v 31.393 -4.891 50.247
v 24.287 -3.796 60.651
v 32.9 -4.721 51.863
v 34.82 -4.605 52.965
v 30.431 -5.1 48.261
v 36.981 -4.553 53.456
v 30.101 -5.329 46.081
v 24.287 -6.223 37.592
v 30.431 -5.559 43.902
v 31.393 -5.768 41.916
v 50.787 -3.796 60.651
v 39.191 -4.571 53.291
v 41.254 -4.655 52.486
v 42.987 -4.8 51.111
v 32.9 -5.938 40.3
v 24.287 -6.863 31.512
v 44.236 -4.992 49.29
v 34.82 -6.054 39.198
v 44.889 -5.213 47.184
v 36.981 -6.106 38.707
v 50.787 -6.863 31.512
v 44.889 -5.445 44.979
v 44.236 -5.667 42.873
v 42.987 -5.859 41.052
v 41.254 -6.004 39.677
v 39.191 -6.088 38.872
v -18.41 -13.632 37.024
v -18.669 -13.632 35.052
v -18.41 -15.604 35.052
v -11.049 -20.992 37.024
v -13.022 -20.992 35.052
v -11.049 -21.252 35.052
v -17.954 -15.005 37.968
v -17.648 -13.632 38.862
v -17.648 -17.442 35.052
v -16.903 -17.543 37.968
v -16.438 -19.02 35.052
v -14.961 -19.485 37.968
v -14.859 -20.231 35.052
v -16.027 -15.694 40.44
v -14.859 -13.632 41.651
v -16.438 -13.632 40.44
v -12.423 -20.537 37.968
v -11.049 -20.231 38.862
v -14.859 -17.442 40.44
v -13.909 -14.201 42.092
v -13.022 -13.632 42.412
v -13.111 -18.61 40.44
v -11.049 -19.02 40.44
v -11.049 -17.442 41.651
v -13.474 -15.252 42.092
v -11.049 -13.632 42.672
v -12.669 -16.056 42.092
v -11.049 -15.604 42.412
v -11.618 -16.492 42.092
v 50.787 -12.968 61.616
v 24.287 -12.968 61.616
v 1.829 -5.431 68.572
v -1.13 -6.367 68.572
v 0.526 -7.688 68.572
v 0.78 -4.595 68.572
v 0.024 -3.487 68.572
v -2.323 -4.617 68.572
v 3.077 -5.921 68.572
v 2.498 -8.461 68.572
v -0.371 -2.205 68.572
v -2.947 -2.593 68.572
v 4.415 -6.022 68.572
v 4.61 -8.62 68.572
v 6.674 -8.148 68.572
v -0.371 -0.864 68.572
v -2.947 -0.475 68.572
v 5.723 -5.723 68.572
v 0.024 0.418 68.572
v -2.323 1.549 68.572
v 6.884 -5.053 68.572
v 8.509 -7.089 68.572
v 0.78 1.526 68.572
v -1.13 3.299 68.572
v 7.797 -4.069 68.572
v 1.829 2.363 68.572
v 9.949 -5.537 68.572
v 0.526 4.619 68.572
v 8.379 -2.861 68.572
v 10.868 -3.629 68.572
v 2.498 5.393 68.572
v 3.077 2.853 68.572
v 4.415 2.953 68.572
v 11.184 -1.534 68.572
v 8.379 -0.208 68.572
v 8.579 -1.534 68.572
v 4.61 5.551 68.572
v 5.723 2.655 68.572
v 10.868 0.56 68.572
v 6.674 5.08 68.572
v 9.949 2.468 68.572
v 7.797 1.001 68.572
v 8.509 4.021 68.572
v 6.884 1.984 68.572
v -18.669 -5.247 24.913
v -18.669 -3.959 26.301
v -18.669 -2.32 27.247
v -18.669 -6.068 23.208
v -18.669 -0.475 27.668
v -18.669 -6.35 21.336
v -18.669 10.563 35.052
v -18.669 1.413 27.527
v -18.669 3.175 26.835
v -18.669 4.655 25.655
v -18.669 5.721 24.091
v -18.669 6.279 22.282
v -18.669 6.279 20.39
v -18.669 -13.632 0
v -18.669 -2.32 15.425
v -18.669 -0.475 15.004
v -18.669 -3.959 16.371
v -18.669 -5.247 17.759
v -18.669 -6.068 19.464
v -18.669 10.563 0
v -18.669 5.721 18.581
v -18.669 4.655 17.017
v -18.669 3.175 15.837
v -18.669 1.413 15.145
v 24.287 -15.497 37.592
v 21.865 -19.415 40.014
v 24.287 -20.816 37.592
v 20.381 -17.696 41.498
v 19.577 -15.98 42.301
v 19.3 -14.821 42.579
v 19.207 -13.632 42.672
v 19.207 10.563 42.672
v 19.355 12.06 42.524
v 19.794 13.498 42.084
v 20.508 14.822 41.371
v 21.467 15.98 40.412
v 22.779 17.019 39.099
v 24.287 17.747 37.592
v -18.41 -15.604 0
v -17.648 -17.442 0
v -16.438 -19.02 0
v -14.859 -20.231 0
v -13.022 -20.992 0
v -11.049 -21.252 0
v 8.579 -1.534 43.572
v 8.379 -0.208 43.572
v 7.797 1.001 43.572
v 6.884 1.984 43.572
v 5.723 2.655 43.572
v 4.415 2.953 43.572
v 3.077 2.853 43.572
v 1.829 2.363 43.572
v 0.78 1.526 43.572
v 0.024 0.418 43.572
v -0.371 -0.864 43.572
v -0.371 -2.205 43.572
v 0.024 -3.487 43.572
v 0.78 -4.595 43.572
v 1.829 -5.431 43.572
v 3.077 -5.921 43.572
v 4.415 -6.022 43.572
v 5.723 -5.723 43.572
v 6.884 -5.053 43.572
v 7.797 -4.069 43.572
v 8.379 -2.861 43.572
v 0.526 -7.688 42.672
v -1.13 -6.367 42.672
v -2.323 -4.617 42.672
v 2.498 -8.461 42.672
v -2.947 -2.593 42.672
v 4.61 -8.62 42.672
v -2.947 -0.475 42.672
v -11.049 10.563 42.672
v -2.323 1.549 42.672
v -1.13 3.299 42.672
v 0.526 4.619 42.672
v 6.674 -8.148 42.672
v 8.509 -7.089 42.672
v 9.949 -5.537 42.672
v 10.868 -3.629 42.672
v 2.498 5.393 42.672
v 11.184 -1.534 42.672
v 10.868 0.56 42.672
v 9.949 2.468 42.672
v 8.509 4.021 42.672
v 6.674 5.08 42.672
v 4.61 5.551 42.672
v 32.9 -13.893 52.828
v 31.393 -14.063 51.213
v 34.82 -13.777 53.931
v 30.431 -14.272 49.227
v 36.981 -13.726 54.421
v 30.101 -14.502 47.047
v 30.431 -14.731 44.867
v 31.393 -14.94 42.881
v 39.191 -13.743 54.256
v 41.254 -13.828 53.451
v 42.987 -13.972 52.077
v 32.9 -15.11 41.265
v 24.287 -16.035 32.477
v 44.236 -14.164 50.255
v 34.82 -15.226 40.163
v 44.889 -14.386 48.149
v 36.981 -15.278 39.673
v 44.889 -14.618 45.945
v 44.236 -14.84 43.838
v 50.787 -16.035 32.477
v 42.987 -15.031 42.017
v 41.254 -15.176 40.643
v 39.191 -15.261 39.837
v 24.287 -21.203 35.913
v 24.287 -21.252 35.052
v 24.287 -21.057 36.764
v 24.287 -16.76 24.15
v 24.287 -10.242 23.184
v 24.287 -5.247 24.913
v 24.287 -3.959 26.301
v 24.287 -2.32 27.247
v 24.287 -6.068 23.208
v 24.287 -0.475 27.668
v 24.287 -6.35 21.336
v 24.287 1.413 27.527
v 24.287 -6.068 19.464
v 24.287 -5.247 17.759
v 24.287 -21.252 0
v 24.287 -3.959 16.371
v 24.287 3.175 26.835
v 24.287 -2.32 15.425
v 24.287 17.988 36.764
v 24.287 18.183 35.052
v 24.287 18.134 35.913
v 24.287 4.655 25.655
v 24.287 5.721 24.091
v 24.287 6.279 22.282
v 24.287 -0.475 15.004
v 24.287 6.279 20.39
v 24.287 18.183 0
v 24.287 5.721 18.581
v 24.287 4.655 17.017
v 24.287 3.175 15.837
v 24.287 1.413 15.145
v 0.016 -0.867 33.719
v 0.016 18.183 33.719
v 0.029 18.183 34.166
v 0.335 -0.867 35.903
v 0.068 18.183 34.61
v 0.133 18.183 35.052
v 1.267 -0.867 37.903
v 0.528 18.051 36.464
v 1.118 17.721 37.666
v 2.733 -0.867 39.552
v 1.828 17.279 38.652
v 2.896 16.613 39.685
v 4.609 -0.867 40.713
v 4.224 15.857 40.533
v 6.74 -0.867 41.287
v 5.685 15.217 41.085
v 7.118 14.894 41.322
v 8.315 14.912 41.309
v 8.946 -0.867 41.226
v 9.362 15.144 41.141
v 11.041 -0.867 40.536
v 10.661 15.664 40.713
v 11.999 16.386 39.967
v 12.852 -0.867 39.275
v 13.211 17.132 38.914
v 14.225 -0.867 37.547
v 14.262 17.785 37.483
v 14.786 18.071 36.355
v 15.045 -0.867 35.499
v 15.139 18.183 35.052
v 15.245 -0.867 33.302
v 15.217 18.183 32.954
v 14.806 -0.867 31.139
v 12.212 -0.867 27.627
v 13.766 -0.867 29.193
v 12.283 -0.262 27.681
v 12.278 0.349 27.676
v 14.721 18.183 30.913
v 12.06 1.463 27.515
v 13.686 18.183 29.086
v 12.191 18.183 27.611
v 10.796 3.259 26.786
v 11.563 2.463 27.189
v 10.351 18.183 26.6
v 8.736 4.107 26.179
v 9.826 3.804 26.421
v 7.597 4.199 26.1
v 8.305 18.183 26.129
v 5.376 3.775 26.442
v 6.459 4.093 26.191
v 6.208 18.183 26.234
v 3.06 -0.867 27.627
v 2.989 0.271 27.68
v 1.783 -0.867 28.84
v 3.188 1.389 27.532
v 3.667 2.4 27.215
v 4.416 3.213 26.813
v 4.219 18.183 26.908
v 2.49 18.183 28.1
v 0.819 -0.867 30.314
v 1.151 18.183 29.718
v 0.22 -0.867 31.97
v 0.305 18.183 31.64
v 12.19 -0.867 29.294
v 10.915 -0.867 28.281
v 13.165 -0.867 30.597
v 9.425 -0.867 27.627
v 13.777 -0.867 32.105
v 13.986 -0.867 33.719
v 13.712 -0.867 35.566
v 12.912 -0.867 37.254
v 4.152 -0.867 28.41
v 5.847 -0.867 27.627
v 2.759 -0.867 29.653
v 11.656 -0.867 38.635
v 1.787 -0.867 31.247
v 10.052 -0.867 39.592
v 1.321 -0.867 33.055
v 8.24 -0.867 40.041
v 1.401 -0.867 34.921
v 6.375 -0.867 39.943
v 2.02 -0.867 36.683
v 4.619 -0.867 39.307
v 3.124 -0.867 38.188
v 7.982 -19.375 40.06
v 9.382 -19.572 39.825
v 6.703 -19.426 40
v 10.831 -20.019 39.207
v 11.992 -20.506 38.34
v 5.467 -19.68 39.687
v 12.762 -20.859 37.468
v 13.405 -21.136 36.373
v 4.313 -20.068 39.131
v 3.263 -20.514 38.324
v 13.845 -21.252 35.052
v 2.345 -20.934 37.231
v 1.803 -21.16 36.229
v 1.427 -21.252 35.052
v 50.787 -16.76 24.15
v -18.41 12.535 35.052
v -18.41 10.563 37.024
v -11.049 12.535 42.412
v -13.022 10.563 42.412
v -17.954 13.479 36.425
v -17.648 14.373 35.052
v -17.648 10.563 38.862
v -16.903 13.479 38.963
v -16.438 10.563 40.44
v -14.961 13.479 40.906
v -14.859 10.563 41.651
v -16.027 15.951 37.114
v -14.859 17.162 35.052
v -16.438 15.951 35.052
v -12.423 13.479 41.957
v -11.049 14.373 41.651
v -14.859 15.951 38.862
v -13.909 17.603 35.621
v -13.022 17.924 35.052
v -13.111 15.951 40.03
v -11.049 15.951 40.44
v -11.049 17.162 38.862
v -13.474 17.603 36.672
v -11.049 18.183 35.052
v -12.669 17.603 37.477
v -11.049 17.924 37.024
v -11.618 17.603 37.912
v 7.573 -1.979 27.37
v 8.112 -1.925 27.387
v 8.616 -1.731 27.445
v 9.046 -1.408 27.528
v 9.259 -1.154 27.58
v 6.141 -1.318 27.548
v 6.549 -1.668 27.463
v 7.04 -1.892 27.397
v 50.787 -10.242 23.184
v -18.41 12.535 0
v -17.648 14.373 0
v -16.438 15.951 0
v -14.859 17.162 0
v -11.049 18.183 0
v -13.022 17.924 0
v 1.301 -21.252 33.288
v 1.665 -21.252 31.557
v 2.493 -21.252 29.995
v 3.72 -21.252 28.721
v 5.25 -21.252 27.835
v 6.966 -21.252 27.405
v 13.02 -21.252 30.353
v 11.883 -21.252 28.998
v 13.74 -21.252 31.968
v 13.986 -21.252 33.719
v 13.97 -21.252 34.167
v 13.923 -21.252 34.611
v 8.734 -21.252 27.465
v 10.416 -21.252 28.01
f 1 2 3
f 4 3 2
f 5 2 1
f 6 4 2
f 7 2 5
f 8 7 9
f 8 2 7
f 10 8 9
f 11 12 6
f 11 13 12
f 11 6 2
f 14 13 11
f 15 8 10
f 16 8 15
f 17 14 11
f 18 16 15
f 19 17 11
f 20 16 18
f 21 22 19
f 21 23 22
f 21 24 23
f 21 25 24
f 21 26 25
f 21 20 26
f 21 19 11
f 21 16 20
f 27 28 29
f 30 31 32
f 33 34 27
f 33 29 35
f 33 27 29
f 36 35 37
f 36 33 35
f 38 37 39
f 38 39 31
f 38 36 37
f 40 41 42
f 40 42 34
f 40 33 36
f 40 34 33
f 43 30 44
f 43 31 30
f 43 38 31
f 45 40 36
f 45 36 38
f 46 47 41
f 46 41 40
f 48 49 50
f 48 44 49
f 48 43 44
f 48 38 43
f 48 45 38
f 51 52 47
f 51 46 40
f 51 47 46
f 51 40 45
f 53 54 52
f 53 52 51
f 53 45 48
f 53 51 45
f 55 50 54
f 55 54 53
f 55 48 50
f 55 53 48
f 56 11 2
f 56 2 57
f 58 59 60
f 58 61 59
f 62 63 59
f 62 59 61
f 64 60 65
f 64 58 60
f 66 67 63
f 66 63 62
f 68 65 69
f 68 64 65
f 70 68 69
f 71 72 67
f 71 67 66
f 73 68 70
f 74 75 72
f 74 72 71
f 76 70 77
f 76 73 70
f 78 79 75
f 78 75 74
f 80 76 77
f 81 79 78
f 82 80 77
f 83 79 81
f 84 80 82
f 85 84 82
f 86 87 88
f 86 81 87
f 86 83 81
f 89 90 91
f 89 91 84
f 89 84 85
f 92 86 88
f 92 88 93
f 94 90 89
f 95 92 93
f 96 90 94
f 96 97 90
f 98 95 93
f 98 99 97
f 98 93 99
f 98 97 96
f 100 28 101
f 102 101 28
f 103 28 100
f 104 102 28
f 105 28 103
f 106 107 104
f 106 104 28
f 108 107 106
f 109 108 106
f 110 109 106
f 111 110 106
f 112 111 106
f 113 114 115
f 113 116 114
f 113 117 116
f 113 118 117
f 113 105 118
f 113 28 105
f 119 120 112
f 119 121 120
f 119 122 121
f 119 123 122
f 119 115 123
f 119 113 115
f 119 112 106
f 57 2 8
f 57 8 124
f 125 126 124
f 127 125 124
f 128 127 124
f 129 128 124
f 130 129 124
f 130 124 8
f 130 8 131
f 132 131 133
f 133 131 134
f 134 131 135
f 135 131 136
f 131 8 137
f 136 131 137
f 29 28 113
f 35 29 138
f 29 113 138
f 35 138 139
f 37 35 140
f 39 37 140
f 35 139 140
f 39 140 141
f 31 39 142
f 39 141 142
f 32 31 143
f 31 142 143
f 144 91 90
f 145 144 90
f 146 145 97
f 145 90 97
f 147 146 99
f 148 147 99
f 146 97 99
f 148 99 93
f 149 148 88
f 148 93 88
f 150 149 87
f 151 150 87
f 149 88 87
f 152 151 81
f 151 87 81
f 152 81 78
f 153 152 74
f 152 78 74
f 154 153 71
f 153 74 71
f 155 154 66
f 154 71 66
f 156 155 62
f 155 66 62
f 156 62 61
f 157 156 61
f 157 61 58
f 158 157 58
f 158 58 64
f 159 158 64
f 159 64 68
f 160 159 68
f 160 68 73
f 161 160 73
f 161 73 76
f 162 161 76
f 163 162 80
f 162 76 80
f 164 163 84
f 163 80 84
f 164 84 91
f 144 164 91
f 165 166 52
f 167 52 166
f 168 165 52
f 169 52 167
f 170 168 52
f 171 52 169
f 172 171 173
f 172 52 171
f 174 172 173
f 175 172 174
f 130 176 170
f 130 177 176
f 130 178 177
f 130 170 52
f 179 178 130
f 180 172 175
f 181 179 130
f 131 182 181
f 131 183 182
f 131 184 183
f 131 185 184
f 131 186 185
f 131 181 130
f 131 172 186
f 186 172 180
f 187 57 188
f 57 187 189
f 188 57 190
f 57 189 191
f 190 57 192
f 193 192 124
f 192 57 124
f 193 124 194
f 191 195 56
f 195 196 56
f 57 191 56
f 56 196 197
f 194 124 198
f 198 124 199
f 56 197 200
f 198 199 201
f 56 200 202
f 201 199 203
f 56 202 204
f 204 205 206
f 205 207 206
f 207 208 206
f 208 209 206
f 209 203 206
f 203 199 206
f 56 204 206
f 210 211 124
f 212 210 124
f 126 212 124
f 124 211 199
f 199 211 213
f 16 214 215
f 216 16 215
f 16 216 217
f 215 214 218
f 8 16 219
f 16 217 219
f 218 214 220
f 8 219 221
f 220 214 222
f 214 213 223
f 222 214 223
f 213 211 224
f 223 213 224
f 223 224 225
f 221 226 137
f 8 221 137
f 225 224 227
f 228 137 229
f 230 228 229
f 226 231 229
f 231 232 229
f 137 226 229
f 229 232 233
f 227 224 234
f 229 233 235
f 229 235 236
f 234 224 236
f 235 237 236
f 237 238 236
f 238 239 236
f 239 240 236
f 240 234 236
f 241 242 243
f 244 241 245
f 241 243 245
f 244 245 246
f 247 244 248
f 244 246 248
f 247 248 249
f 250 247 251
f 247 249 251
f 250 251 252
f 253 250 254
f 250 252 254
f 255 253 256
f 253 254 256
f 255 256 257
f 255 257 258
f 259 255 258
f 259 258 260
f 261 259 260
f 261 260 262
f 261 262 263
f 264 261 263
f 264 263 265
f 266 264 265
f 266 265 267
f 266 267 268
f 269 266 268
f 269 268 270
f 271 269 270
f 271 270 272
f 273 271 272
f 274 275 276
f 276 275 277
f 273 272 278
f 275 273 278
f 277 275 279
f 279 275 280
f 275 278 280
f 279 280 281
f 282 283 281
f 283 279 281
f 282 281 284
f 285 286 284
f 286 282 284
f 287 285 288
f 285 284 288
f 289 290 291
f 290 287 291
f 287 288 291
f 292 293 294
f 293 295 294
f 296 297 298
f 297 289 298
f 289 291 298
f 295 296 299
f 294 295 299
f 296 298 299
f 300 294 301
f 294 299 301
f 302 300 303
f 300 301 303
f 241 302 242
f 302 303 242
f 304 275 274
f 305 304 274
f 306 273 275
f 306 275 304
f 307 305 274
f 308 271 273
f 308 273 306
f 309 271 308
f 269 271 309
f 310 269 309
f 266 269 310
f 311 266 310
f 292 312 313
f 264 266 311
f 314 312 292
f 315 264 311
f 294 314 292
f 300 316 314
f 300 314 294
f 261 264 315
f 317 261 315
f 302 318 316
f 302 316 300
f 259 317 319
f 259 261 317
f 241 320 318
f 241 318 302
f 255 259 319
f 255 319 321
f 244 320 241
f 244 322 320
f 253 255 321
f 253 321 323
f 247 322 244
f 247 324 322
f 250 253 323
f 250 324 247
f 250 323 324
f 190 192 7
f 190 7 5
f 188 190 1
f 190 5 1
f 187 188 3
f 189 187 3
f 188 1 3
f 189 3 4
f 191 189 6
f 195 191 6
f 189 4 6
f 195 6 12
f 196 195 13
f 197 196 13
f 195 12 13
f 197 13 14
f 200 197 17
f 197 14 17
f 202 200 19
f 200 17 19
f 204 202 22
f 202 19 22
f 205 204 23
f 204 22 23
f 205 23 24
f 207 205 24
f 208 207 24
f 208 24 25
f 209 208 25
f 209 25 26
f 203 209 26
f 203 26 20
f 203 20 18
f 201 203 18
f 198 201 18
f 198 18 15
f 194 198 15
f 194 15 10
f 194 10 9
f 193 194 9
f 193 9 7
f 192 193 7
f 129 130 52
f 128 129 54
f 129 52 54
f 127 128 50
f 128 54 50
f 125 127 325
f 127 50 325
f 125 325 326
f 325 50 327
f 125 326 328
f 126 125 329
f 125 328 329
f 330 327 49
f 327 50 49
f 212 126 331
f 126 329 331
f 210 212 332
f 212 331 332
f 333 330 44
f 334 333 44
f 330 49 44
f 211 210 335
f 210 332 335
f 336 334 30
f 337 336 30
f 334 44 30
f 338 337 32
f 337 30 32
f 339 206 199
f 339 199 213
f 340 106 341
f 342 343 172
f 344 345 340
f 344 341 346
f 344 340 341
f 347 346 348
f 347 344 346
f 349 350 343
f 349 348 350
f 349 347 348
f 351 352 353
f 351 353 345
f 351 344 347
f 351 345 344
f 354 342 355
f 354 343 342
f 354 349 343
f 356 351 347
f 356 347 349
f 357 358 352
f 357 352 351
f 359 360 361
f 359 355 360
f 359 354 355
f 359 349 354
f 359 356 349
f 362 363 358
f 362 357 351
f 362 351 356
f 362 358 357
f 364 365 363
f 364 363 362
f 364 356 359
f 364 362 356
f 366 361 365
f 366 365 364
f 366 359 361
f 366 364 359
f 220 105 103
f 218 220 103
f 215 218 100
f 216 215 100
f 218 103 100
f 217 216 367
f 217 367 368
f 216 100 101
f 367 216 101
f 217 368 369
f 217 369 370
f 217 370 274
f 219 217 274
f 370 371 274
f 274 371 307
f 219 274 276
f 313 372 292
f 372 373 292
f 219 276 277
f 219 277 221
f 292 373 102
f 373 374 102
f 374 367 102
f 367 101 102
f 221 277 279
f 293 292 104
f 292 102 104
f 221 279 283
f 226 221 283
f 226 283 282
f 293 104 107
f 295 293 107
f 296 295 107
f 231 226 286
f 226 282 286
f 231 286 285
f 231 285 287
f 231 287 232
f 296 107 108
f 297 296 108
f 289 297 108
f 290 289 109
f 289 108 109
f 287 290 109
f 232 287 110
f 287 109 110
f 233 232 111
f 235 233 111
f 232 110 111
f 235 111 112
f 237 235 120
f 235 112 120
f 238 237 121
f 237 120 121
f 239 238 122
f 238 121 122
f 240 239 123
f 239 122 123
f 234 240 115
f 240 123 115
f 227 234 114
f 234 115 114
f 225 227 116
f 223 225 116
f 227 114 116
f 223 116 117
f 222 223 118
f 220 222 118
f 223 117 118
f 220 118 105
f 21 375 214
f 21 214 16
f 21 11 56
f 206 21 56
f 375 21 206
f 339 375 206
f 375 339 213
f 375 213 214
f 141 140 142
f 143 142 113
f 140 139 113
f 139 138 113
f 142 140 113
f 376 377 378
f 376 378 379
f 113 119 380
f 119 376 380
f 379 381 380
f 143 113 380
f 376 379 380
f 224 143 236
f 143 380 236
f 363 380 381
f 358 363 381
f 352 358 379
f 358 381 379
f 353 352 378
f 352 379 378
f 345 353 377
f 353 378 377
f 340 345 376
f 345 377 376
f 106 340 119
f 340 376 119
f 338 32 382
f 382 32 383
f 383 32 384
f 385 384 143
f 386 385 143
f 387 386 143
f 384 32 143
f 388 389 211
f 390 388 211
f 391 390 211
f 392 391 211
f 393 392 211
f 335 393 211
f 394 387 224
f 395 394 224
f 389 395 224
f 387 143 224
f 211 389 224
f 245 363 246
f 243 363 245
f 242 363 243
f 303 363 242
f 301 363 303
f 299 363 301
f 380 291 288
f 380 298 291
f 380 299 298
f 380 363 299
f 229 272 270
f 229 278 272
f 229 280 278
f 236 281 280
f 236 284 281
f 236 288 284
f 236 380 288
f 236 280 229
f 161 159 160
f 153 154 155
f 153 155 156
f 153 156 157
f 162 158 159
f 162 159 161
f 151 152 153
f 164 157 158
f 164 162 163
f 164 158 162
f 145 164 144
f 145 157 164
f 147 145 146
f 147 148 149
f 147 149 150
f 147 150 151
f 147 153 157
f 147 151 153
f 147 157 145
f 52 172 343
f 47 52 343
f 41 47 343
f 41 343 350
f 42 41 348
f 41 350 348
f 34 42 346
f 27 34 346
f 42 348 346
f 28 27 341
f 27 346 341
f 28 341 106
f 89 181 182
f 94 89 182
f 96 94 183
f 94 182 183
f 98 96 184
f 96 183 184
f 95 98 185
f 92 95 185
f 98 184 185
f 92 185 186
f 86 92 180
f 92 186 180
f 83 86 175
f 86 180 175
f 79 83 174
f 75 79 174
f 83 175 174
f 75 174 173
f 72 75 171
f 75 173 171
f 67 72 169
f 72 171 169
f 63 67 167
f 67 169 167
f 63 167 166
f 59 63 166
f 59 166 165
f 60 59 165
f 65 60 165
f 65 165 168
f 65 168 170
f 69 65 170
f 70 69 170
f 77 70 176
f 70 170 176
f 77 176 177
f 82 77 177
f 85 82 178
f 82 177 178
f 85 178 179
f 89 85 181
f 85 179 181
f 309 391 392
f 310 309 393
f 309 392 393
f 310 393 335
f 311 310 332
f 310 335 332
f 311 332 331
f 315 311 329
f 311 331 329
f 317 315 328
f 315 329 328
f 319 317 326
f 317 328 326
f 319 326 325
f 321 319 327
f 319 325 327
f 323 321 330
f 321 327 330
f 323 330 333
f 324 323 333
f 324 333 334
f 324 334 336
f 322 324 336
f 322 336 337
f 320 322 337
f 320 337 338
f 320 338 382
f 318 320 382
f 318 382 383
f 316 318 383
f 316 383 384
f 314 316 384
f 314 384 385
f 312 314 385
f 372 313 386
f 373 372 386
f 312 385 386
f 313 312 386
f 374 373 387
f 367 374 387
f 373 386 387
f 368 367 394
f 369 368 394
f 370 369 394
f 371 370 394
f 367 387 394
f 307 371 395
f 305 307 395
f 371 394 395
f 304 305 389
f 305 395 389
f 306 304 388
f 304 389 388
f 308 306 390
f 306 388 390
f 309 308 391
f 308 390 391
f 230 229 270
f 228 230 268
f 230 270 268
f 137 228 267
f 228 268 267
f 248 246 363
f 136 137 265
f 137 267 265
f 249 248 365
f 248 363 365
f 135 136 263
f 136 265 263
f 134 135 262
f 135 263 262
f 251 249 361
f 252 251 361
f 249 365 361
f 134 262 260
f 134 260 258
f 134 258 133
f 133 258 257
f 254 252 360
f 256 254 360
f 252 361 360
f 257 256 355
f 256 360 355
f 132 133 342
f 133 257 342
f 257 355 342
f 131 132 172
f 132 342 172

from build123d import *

# Parameters (mm, degrees)
F0_W           = 42.9559741169
F0_H           = 39.4349899143
F1_DEPTH       = 42.672
F3_D           = 12.7
F3_DEPTH       = 50.8
F3_TIP         = 3.8154649308
F5_D           = 12.7
F5_CBORE_D     = 15.24
F5_CBORE_DEPTH = 19.05
F6_SIZE        = 5.08
F7_T1_DEPTH    = 54.102
F7_T3_DEPTH    = 49.3059741169
F7_T5_DEPTH    = 24.1949899143
F7_S9_W        = 7.62
F7_S9_H        = 7.62
F7_T10_DEPTH   = 7.62
F7_S15_W       = 7.62
F7_S15_H       = 7.62
F7_T16_DEPTH   = 7.62
F11_R          = 7.1053142902
F12_DEPTH      = 25.9
F14_DEPTH      = 26.5
F15_DEPTH      = 29.3
F16_R          = 4.5
F17_DEPTH      = 25
F18_R          = 7.4357269109
F19_DEPTH      = 25


# Not quite as in the source:
# - a fillet or chamfer that OpenCascade refuses, or shapes differently, is made with other operations: its cross-section is extruded or revolved along the edge and cut away or added
# - the program builds the solid bodies; features that only make, move or delete a surface that nothing else refers to are left out


with BuildPart() as f1:
    # F0 (on Top) → F1 (new body)
    with BuildSketch(Plane.XY):
        with Locations((2.8086053208, -1.5343176201)):
            Rectangle(F0_W, F0_H)
    extrude(amount=F1_DEPTH)

    # F3
    with Locations(Plane.YZ.offset(24.2865923792)):
        with Locations((0, 21.336)):
            Hole(F3_D / 2, depth=F3_DEPTH)
            with Locations((0, 0, -(F3_DEPTH + F3_TIP / 2))):  # 118° drill point
                Cone(0, F3_D / 2, F3_TIP, mode=Mode.SUBTRACT)

    # F5 (through all)
    with Locations(Plane(origin=(0, 18.1831773371, 0), x_dir=(-1, 0, 0), z_dir=(0, 1, 0))):
        with Locations((-7.6360311359, 33.7194018066)):
            CounterBoreHole(F5_D / 2, F5_CBORE_D / 2, F5_CBORE_DEPTH)

    # F6
    f6_edges = [f1.edges().sort_by_distance(p)[0] for p in [
        (24.286592, -1.534318, 42.672),
    ]]
    chamfer(f6_edges, length=F6_SIZE)

    # F7: fillet of radius 7.62 on 5 edges, made by hand

    # F7_s2 → F7_t1 (cut)
    with BuildSketch(Plane.XY.offset(-19.05)):
        with BuildLine():
            ThreePointArc((-11.0493817377, 18.1831773371), (-16.4375354104, 15.9513310097), (-18.6693817377, 10.5631773371))
            Line((-18.6693817377, 10.5631773371), (-18.6693817377, 18.1831773371))
            Line((-18.6693817377, 18.1831773371), (-11.0493817377, 18.1831773371))
        make_face()
        with BuildLine():
            ThreePointArc((-18.6693817377, -13.6318125772), (-16.4375354104, -19.0199662499), (-11.0493817377, -21.2518125772))
            Line((-11.0493817377, -21.2518125772), (-18.6693817377, -21.2518125772))
            Line((-18.6693817377, -21.2518125772), (-18.6693817377, -13.6318125772))
        make_face()
    extrude(amount=F7_T1_DEPTH, mode=Mode.SUBTRACT)

    # F7_s4 → F7_t3 (cut)
    with BuildSketch(Plane.YZ.offset(-11.0493817377)):
        with BuildLine():
            ThreePointArc((18.1831773371, 35.052), (15.9513310097, 40.4401536726), (10.5631773371, 42.672))
            Line((10.5631773371, 42.672), (18.1831773371, 42.672))
            Line((18.1831773371, 42.672), (18.1831773371, 35.052))
        make_face()
        with BuildLine():
            ThreePointArc((-13.6318125772, 42.672), (-19.0199662499, 40.4401536726), (-21.2518125772, 35.052))
            Line((-21.2518125772, 35.052), (-21.2518125772, 42.672))
            Line((-21.2518125772, 42.672), (-13.6318125772, 42.672))
        make_face()
    extrude(amount=F7_T3_DEPTH, mode=Mode.SUBTRACT)

    # F7_s6 → F7_t5 (cut)
    with BuildSketch(Plane.XZ.offset(-10.5631773371)):
        with BuildLine():
            ThreePointArc((-11.0493817377, 42.672), (-16.4375354104, 40.4401536726), (-18.6693817377, 35.052))
            Line((-18.6693817377, 35.052), (-18.6693817377, 42.672))
            Line((-18.6693817377, 42.672), (-11.0493817377, 42.672))
        make_face()
    extrude(amount=F7_T5_DEPTH, mode=Mode.SUBTRACT)


with BuildPart() as f7_tool8:
    # F7_s9 → F7_t10 (new body)
    with BuildSketch(Plane.XZ.offset(-10.5631773371)):
        with Locations((-14.8593817377, 38.862)):
            Rectangle(F7_S9_W, F7_S9_H)
    extrude(amount=-F7_T10_DEPTH)

    # F7_s11 → F7_t12 (revolve, cut)
    with BuildSketch(Plane(origin=(-11.0493817377, 10.5631773371, 35.052), x_dir=(0.7071067812, 0, -0.7071067812), z_dir=(0.7071067812, 0, 0.7071067812))):
        with BuildLine():
            ThreePointArc((0, -7.62), (7.62, 0), (0, 7.62))
            Line((0, 7.62), (0, -7.62))
        make_face()
    revolve(axis=Axis((-11.0493817377, 10.5631773371, 35.052), (0, 1, 0)), mode=Mode.SUBTRACT)


with BuildPart() as f1_1:
    add(f1.part)

    # F7_t7: cut F7_tool8
    add(f7_tool8.part, mode=Mode.SUBTRACT)


with BuildPart() as f7_tool14:
    # F7_s15 → F7_t16 (new body)
    with BuildSketch(Plane.XY.offset(35.052)):
        with Locations((-14.8593817377, -17.4418125772)):
            Rectangle(F7_S15_W, F7_S15_H)
    extrude(amount=F7_T16_DEPTH)

    # F7_s17 → F7_t18 (revolve, cut)
    with BuildSketch(Plane(origin=(-11.0493817377, -13.6318125772, 35.052), x_dir=(0.7071067812, 0.7071067812, 0), z_dir=(0.7071067812, -0.7071067812, 0))):
        with BuildLine():
            ThreePointArc((0, -7.62), (7.62, 0), (0, 7.62))
            Line((0, 7.62), (0, -7.62))
        make_face()
    revolve(axis=Axis((-11.0493817377, -13.6318125772, 35.052), (0, 0, 1)), mode=Mode.SUBTRACT)


with BuildPart() as f1_2:
    add(f1_1.part)

    # F7_t13: cut F7_tool14
    add(f7_tool14.part, mode=Mode.SUBTRACT)

    # F11 (on face) → F12 (join)
    with BuildSketch(Plane.XY.offset(42.672)):
        with Locations((4.0786053208, -1.5343176201)):
            Circle(F11_R)
    extrude(amount=F12_DEPTH)

    # F13 (on face) → F14 (join)
    with BuildSketch(Plane.YZ.offset(24.2865923792)):
        Polygon((-6.8631088361, 31.5118990839), (-16.0354040563, 32.4774049222), (-16.7595334351, 24.1499263793), (-10.2423755452, 23.1844205409), align=None)
    extrude(amount=F14_DEPTH)

    # F15 (add): a face of the model
    f15_faces = [f1_2.faces().sort_by_distance(p)[0] for p in [
        (37.5365923792, -11.4492564462, 31.994652003),
    ]]
    extrude(f15_faces, amount=F15_DEPTH)

    # F16 (on face) → F17 (cut)
    with BuildSketch(Plane.XY.offset(68.572)):
        with Locations((4.0786053208, -1.5343176201)):
            Circle(F16_R)
    extrude(amount=-F17_DEPTH, mode=Mode.SUBTRACT)

    # F18 (on face) → F19 (cut)
    with BuildSketch(Plane(origin=(0, -10.0685909657, 1.0598528644), x_dir=(-1, 0, 0), z_dir=(0, 0.9945054407, -0.1046849002))):
        with Locations((-37.5365923792, 45.2702912239)):
            Circle(F18_R)
    extrude(amount=-F19_DEPTH, mode=Mode.SUBTRACT)


solid = f1_2.part
